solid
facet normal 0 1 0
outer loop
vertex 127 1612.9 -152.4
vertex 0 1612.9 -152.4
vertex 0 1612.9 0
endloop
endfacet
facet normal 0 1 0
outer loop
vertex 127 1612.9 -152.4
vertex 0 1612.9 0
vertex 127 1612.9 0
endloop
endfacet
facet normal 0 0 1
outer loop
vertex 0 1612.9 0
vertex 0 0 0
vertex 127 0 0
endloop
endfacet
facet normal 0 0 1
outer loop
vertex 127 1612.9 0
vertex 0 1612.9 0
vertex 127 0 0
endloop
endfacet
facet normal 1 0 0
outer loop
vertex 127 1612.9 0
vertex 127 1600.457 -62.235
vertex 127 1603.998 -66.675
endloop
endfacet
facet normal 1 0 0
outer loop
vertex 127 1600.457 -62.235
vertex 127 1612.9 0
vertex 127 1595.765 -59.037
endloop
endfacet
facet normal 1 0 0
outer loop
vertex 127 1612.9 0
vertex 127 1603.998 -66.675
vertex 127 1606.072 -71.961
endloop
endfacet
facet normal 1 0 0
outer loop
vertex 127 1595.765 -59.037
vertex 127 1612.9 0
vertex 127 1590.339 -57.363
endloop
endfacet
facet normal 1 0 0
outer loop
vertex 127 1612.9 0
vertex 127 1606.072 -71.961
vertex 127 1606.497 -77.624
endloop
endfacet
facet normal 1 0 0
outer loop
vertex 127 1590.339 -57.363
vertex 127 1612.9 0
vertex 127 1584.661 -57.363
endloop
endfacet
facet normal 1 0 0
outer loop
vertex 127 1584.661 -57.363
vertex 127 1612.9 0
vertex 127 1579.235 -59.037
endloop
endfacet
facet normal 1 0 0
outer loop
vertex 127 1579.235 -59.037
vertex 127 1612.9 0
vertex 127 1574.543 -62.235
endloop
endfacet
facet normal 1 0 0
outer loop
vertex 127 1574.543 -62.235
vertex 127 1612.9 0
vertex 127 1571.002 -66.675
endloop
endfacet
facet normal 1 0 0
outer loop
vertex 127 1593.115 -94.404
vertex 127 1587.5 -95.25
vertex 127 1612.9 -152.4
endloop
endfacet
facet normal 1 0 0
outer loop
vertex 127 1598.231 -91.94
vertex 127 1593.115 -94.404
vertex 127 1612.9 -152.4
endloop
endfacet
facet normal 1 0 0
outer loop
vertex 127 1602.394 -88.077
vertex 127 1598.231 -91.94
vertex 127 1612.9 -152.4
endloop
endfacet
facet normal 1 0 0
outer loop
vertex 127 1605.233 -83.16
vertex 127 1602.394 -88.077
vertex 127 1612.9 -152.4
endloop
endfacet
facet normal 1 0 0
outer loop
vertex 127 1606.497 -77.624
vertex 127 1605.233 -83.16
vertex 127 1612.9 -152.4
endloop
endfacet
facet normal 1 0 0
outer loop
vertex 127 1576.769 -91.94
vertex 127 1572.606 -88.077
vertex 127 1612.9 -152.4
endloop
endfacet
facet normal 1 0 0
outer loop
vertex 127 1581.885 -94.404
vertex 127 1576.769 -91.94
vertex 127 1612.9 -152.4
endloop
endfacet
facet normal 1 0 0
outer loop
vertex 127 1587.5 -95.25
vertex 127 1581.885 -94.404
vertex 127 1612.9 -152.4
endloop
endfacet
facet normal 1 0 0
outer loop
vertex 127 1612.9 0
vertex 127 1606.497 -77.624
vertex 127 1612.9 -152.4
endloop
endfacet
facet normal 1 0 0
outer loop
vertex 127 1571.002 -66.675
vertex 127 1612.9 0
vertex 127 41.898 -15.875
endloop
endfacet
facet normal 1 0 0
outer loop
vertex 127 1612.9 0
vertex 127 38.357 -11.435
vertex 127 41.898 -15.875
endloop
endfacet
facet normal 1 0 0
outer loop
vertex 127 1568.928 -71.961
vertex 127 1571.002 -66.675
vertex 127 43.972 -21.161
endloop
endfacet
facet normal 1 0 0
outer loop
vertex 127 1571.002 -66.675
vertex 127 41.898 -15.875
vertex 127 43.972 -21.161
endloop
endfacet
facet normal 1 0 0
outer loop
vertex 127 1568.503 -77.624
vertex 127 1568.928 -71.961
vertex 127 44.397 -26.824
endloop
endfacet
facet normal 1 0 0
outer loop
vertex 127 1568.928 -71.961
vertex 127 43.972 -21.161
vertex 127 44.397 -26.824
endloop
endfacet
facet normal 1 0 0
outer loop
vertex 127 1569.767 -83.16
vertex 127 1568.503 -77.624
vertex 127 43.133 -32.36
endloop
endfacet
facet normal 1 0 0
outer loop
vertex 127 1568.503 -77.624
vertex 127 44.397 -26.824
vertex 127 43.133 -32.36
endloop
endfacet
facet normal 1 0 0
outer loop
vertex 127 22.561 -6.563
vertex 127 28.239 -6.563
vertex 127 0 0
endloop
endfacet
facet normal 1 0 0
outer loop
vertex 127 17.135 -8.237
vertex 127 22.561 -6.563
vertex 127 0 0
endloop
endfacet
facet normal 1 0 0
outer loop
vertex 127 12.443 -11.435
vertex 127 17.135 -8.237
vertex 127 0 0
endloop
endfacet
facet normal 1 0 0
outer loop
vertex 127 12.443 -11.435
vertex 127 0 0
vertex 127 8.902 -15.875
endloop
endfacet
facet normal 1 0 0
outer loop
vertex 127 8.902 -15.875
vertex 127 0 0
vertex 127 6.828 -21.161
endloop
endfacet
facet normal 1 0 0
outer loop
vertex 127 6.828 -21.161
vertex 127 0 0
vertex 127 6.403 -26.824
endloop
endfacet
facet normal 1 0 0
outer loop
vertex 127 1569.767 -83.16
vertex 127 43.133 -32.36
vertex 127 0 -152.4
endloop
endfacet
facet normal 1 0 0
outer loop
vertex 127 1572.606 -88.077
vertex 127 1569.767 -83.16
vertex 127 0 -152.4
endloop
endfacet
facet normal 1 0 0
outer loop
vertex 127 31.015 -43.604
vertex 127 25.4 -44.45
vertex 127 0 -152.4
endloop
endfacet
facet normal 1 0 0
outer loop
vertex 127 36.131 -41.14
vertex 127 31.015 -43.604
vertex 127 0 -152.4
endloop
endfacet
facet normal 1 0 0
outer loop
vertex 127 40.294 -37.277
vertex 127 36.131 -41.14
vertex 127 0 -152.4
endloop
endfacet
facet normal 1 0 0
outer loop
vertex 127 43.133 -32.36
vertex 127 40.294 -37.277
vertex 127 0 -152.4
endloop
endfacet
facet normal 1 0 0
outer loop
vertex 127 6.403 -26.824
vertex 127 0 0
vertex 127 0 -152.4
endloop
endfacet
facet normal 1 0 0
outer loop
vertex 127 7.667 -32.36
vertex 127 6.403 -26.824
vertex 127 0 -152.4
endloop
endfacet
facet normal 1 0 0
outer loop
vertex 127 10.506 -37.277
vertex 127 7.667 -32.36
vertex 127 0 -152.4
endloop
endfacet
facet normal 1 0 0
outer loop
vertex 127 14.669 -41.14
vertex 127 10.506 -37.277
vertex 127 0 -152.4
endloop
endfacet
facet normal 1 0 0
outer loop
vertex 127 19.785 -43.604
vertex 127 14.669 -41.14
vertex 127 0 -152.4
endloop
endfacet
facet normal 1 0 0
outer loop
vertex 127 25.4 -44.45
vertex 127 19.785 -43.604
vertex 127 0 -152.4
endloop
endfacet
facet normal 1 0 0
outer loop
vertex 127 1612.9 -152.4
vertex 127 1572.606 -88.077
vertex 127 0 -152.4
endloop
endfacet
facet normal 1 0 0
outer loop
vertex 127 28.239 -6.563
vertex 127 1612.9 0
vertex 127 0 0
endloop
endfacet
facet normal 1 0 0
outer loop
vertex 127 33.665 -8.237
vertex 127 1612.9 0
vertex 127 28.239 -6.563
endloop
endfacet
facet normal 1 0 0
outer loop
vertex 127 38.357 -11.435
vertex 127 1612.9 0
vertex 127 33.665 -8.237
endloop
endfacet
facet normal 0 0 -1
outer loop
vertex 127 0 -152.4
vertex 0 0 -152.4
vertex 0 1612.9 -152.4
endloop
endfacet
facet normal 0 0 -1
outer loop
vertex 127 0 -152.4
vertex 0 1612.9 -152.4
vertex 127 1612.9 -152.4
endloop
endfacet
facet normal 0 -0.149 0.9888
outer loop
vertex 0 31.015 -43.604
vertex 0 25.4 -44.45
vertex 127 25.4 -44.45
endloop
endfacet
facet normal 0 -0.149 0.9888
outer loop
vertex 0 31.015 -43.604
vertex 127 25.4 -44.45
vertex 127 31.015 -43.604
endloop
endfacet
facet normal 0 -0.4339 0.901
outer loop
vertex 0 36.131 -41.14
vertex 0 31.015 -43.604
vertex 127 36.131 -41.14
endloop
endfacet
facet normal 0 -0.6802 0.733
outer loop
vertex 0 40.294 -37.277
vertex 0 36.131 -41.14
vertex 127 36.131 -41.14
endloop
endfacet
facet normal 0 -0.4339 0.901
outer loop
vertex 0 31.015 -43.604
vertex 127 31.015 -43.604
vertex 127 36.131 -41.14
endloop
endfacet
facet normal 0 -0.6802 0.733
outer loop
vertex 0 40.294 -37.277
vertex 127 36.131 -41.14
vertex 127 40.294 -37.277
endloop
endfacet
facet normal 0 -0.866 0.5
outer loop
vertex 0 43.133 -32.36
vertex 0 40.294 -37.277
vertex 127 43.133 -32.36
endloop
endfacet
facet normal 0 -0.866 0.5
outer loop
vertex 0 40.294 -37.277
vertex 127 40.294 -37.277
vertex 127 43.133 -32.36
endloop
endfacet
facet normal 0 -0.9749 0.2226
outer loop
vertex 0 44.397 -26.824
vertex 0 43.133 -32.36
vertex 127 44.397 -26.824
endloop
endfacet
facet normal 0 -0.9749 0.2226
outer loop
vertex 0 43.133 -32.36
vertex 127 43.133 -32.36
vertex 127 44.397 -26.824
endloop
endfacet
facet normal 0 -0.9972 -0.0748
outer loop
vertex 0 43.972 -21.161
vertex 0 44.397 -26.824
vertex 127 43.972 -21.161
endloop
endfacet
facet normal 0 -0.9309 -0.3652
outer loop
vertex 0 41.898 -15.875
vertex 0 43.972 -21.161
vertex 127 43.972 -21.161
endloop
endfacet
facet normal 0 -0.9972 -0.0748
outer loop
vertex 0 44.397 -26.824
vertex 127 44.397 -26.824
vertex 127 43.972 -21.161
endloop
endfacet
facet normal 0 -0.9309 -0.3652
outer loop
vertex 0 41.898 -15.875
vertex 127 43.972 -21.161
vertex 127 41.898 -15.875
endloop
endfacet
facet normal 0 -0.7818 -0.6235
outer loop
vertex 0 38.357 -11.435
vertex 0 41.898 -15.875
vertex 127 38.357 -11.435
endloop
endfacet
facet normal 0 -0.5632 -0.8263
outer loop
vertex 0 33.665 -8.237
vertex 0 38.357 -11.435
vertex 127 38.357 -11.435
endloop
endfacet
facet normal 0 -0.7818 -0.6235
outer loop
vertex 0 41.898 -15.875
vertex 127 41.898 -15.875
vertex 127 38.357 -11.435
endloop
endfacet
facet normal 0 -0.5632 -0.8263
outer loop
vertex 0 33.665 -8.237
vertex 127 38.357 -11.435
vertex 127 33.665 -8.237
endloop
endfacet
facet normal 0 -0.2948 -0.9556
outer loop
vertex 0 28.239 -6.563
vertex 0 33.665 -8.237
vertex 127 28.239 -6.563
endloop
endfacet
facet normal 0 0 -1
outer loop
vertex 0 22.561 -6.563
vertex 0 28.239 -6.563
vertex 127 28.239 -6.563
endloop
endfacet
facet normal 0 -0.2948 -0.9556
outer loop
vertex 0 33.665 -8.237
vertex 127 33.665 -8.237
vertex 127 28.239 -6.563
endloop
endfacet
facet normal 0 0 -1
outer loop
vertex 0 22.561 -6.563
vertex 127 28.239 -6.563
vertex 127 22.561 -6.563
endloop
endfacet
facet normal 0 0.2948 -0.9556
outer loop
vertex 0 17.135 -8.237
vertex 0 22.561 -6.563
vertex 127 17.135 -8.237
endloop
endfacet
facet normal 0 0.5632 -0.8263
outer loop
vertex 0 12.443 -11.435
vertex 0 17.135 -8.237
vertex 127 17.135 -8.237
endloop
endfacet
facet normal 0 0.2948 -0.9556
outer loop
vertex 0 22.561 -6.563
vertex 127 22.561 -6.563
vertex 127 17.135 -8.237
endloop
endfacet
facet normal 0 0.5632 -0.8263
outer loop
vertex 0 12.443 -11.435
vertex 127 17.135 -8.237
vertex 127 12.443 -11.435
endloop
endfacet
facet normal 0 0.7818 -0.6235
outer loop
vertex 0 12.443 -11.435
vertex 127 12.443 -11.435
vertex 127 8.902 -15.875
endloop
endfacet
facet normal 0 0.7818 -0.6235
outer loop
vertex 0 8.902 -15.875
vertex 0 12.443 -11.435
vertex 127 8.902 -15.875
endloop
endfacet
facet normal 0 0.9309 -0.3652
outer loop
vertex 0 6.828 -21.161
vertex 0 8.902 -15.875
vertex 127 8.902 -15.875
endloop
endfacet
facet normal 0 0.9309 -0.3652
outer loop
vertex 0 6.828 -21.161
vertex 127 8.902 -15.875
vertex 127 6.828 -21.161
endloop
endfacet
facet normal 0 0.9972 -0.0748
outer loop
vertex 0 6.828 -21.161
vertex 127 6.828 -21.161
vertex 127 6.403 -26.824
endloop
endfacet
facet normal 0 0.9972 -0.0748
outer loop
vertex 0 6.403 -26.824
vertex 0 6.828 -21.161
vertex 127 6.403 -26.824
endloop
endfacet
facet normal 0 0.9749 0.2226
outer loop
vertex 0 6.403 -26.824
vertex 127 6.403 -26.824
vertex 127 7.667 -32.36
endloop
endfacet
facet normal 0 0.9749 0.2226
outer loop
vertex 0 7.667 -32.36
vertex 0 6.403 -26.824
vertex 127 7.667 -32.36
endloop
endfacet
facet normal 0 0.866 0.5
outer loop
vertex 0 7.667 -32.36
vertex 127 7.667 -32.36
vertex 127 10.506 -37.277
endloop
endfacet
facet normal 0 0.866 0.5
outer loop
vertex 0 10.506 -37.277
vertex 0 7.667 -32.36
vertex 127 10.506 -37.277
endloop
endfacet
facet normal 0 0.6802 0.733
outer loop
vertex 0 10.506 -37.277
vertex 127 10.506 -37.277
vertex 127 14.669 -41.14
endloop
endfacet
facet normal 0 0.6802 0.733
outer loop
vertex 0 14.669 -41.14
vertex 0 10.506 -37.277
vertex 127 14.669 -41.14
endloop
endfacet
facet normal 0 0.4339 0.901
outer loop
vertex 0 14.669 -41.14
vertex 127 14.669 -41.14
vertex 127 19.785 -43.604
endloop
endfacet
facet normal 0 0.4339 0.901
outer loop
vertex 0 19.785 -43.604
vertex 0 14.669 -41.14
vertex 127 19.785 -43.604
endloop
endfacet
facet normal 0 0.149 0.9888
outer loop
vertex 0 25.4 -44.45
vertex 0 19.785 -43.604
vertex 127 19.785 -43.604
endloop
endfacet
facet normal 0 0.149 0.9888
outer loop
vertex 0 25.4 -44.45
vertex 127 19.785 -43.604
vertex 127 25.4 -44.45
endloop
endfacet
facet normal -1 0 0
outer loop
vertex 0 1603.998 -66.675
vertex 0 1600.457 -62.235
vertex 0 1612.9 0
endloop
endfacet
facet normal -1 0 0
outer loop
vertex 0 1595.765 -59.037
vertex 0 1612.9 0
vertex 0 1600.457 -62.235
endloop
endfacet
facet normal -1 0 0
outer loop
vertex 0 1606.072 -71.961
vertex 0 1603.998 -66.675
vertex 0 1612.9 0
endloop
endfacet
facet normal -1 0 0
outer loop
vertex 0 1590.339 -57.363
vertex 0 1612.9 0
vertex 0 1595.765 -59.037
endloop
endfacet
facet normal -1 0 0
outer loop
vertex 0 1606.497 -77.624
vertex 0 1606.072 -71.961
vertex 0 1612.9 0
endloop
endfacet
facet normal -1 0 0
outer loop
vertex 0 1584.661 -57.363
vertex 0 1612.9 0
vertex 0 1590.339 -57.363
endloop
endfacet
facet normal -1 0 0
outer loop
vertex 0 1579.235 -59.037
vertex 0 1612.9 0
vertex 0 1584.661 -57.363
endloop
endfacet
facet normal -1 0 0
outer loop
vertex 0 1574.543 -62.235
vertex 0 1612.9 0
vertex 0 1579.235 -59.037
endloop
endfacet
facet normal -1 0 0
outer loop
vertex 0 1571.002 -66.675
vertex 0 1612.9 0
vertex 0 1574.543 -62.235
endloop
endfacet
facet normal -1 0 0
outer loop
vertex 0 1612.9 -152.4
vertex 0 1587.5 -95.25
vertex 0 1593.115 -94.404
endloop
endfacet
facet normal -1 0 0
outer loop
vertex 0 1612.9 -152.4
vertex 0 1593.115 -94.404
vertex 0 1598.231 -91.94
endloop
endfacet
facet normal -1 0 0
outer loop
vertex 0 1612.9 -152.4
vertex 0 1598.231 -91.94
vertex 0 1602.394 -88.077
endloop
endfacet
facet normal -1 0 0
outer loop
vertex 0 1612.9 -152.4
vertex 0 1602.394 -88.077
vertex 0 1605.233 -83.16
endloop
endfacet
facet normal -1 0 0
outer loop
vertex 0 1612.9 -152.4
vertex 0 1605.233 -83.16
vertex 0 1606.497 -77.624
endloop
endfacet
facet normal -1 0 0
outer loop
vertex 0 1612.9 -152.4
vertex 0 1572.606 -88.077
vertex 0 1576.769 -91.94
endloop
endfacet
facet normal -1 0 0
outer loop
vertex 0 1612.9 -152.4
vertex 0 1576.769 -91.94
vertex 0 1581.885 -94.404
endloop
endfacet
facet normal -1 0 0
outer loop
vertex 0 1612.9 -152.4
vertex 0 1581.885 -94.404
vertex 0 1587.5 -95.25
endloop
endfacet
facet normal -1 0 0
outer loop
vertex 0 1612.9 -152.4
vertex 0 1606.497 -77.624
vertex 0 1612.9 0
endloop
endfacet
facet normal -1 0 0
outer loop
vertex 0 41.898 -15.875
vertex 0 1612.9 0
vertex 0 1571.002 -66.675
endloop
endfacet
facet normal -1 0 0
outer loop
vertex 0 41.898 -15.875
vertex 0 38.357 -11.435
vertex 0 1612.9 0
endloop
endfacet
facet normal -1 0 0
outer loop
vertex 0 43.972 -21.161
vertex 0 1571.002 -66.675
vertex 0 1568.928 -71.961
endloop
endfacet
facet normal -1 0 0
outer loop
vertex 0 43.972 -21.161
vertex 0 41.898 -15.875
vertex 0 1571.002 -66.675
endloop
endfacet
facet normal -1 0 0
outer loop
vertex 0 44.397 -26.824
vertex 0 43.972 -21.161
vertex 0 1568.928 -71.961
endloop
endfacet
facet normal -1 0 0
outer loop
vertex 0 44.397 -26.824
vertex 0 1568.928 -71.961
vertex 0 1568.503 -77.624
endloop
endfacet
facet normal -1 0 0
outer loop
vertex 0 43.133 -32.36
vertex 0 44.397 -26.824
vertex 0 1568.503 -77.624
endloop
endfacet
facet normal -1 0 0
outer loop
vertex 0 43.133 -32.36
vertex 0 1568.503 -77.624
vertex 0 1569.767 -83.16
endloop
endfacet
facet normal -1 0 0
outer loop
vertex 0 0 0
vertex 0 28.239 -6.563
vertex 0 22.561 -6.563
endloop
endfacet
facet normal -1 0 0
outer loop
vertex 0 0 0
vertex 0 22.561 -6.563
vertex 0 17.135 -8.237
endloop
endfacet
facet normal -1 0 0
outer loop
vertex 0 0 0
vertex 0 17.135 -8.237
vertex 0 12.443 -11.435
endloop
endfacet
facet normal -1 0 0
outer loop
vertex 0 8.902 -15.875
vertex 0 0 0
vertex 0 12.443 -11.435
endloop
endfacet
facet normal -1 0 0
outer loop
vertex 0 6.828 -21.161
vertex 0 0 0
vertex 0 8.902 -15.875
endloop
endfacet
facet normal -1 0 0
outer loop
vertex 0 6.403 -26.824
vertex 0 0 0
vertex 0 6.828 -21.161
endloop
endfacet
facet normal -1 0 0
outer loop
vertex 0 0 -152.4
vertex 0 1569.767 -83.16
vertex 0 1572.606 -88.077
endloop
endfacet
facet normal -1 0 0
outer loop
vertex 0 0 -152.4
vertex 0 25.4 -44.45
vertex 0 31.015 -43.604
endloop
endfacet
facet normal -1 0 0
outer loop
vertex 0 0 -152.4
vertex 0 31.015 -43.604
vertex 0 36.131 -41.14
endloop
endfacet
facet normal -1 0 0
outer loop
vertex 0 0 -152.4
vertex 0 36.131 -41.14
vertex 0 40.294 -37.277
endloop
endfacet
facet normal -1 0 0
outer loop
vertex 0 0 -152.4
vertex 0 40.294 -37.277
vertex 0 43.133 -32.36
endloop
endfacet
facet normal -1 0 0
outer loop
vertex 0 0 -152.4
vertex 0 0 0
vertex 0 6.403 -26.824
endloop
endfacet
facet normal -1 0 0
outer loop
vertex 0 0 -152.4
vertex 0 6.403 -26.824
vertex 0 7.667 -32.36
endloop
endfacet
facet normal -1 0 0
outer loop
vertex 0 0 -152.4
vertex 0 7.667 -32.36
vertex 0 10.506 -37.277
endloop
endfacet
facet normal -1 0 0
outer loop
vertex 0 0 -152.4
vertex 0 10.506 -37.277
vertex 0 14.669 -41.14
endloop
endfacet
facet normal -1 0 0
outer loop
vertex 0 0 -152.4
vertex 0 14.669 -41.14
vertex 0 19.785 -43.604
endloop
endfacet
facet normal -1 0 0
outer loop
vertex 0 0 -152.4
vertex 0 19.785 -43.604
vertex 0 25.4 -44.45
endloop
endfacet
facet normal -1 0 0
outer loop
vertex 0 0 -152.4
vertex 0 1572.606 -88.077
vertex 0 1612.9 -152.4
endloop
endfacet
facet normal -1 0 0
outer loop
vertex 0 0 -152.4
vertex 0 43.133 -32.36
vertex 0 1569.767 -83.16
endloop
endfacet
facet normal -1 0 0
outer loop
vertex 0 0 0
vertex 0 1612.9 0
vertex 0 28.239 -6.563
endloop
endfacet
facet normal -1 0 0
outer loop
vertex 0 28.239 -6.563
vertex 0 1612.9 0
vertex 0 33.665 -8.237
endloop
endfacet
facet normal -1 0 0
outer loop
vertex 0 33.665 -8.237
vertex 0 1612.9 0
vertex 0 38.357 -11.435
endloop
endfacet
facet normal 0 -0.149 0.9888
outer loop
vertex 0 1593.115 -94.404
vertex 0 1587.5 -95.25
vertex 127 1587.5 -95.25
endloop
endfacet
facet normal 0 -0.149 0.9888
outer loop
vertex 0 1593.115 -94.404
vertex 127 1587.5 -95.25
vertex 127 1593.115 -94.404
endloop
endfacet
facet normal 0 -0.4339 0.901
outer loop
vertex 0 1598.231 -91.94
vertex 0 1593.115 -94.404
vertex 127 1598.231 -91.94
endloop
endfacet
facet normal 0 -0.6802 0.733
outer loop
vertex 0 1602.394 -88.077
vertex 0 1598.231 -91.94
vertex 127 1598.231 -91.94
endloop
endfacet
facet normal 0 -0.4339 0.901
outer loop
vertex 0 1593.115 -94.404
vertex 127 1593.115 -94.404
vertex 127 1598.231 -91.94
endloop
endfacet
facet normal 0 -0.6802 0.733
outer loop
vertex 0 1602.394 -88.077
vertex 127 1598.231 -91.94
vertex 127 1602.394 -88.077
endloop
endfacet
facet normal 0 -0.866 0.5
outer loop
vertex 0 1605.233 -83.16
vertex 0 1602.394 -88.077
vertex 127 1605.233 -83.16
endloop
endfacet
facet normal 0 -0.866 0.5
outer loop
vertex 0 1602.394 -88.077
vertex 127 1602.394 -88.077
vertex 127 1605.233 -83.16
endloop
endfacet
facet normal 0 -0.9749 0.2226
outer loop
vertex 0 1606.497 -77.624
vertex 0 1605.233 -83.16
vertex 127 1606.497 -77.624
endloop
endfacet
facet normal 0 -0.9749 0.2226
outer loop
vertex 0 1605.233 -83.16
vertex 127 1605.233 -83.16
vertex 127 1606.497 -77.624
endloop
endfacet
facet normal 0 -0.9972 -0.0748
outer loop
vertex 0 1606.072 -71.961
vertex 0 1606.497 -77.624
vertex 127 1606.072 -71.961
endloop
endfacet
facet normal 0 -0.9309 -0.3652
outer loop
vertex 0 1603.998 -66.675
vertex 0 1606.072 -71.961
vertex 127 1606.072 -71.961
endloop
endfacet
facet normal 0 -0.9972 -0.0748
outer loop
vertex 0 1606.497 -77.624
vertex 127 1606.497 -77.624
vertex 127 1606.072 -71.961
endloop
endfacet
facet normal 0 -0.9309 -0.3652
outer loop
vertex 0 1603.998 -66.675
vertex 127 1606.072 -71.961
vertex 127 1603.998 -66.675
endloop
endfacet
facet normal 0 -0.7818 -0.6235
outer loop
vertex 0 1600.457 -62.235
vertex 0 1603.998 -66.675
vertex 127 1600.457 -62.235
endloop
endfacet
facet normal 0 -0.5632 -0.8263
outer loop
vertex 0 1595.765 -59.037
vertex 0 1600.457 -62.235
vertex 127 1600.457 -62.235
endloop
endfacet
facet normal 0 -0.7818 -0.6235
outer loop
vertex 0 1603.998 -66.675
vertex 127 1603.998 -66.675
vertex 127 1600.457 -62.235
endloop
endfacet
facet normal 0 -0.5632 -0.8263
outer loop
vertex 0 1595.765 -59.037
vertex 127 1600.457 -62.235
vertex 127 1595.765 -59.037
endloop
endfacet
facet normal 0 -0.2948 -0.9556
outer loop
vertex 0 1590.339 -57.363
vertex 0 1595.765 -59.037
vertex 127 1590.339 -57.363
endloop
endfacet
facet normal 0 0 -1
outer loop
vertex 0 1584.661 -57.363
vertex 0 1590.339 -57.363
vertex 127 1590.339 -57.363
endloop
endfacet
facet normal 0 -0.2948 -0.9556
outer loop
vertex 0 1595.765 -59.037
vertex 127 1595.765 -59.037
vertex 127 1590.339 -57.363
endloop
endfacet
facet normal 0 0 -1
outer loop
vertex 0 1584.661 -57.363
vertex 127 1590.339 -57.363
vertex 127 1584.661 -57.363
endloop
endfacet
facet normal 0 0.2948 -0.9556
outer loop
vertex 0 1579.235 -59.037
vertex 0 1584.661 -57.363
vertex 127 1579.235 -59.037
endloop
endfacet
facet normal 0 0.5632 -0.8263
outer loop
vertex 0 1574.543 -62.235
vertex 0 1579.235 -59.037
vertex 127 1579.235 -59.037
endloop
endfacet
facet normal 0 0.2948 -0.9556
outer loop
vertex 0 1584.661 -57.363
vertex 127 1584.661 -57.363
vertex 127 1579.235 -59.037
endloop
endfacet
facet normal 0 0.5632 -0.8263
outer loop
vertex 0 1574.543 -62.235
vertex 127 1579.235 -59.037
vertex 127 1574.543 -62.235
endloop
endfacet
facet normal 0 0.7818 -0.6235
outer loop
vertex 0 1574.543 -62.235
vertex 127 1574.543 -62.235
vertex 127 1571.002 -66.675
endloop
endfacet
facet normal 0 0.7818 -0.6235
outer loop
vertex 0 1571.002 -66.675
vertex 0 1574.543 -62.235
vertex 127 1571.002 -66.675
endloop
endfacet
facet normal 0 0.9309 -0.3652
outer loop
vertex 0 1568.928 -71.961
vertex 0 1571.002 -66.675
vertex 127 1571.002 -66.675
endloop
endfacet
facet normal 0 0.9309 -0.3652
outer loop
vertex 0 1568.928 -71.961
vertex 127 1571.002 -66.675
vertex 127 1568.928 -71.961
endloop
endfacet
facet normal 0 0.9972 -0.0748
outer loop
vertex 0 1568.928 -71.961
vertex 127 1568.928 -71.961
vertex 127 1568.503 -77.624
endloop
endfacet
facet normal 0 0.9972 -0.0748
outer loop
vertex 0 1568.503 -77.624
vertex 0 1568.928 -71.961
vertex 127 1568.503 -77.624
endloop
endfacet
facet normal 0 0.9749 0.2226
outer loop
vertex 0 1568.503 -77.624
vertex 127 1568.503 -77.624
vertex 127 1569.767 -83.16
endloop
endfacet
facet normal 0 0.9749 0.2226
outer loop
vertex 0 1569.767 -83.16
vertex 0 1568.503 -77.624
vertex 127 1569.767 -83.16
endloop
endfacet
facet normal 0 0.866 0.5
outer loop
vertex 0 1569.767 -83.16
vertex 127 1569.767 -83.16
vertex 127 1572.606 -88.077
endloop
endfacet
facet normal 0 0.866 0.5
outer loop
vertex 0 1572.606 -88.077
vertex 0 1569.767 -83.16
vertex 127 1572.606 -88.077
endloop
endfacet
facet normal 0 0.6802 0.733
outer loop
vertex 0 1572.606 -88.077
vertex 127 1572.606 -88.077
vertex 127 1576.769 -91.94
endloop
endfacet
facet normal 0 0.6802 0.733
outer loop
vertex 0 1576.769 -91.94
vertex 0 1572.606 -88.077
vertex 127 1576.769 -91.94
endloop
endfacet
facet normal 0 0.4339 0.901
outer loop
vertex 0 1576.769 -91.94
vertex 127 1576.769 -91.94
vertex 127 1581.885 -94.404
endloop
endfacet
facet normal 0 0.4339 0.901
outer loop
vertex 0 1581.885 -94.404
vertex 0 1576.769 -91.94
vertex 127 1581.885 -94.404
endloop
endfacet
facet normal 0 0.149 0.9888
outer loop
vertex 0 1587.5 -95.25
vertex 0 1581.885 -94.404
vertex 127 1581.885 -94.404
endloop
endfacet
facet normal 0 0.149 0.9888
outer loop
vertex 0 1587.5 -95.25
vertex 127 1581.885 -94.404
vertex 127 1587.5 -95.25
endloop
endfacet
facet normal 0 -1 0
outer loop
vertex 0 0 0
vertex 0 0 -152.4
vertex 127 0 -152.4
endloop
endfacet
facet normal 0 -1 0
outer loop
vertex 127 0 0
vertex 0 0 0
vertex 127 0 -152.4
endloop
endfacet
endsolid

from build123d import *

# Parameters (mm, degrees)
SKETCH1_W           = 127
SKETCH1_H           = 152.4
BOSS_EXTRUDE2_DEPTH = 1612.9
SKETCH2_R           = 19.05
CUT_EXTRUDE1_DEPTH  = 152.4
SKETCH3_R           = 19.05
CUT_EXTRUDE2_DEPTH  = 152.4


with BuildPart() as part:
    # Sketch1 → Boss-Extrude2 (new body)
    with BuildSketch(Plane(origin=(0, 0, 0), x_dir=(1, 0, 0), z_dir=(0, 1, 0))):
        with Locations((63.5, 76.2)):
            Rectangle(SKETCH1_W, SKETCH1_H)
    extrude(amount=BOSS_EXTRUDE2_DEPTH)

    # Sketch2 → Cut-Extrude1 (cut)
    with BuildSketch(Plane(origin=(127, 0, 0), x_dir=(0, 0, -1), z_dir=(1, 0, 0))):
        with Locations((25.4, 25.4)):
            Circle(SKETCH2_R)
    extrude(amount=-CUT_EXTRUDE1_DEPTH, mode=Mode.SUBTRACT)

    # Sketch3 → Cut-Extrude2 (cut)
    with BuildSketch(Plane(origin=(127, 0, 0), x_dir=(0, 0, -1), z_dir=(1, 0, 0))):
        with Locations((76.2, 1587.5)):
            Circle(SKETCH3_R)
    extrude(amount=-CUT_EXTRUDE2_DEPTH, mode=Mode.SUBTRACT)


solid = part.part
